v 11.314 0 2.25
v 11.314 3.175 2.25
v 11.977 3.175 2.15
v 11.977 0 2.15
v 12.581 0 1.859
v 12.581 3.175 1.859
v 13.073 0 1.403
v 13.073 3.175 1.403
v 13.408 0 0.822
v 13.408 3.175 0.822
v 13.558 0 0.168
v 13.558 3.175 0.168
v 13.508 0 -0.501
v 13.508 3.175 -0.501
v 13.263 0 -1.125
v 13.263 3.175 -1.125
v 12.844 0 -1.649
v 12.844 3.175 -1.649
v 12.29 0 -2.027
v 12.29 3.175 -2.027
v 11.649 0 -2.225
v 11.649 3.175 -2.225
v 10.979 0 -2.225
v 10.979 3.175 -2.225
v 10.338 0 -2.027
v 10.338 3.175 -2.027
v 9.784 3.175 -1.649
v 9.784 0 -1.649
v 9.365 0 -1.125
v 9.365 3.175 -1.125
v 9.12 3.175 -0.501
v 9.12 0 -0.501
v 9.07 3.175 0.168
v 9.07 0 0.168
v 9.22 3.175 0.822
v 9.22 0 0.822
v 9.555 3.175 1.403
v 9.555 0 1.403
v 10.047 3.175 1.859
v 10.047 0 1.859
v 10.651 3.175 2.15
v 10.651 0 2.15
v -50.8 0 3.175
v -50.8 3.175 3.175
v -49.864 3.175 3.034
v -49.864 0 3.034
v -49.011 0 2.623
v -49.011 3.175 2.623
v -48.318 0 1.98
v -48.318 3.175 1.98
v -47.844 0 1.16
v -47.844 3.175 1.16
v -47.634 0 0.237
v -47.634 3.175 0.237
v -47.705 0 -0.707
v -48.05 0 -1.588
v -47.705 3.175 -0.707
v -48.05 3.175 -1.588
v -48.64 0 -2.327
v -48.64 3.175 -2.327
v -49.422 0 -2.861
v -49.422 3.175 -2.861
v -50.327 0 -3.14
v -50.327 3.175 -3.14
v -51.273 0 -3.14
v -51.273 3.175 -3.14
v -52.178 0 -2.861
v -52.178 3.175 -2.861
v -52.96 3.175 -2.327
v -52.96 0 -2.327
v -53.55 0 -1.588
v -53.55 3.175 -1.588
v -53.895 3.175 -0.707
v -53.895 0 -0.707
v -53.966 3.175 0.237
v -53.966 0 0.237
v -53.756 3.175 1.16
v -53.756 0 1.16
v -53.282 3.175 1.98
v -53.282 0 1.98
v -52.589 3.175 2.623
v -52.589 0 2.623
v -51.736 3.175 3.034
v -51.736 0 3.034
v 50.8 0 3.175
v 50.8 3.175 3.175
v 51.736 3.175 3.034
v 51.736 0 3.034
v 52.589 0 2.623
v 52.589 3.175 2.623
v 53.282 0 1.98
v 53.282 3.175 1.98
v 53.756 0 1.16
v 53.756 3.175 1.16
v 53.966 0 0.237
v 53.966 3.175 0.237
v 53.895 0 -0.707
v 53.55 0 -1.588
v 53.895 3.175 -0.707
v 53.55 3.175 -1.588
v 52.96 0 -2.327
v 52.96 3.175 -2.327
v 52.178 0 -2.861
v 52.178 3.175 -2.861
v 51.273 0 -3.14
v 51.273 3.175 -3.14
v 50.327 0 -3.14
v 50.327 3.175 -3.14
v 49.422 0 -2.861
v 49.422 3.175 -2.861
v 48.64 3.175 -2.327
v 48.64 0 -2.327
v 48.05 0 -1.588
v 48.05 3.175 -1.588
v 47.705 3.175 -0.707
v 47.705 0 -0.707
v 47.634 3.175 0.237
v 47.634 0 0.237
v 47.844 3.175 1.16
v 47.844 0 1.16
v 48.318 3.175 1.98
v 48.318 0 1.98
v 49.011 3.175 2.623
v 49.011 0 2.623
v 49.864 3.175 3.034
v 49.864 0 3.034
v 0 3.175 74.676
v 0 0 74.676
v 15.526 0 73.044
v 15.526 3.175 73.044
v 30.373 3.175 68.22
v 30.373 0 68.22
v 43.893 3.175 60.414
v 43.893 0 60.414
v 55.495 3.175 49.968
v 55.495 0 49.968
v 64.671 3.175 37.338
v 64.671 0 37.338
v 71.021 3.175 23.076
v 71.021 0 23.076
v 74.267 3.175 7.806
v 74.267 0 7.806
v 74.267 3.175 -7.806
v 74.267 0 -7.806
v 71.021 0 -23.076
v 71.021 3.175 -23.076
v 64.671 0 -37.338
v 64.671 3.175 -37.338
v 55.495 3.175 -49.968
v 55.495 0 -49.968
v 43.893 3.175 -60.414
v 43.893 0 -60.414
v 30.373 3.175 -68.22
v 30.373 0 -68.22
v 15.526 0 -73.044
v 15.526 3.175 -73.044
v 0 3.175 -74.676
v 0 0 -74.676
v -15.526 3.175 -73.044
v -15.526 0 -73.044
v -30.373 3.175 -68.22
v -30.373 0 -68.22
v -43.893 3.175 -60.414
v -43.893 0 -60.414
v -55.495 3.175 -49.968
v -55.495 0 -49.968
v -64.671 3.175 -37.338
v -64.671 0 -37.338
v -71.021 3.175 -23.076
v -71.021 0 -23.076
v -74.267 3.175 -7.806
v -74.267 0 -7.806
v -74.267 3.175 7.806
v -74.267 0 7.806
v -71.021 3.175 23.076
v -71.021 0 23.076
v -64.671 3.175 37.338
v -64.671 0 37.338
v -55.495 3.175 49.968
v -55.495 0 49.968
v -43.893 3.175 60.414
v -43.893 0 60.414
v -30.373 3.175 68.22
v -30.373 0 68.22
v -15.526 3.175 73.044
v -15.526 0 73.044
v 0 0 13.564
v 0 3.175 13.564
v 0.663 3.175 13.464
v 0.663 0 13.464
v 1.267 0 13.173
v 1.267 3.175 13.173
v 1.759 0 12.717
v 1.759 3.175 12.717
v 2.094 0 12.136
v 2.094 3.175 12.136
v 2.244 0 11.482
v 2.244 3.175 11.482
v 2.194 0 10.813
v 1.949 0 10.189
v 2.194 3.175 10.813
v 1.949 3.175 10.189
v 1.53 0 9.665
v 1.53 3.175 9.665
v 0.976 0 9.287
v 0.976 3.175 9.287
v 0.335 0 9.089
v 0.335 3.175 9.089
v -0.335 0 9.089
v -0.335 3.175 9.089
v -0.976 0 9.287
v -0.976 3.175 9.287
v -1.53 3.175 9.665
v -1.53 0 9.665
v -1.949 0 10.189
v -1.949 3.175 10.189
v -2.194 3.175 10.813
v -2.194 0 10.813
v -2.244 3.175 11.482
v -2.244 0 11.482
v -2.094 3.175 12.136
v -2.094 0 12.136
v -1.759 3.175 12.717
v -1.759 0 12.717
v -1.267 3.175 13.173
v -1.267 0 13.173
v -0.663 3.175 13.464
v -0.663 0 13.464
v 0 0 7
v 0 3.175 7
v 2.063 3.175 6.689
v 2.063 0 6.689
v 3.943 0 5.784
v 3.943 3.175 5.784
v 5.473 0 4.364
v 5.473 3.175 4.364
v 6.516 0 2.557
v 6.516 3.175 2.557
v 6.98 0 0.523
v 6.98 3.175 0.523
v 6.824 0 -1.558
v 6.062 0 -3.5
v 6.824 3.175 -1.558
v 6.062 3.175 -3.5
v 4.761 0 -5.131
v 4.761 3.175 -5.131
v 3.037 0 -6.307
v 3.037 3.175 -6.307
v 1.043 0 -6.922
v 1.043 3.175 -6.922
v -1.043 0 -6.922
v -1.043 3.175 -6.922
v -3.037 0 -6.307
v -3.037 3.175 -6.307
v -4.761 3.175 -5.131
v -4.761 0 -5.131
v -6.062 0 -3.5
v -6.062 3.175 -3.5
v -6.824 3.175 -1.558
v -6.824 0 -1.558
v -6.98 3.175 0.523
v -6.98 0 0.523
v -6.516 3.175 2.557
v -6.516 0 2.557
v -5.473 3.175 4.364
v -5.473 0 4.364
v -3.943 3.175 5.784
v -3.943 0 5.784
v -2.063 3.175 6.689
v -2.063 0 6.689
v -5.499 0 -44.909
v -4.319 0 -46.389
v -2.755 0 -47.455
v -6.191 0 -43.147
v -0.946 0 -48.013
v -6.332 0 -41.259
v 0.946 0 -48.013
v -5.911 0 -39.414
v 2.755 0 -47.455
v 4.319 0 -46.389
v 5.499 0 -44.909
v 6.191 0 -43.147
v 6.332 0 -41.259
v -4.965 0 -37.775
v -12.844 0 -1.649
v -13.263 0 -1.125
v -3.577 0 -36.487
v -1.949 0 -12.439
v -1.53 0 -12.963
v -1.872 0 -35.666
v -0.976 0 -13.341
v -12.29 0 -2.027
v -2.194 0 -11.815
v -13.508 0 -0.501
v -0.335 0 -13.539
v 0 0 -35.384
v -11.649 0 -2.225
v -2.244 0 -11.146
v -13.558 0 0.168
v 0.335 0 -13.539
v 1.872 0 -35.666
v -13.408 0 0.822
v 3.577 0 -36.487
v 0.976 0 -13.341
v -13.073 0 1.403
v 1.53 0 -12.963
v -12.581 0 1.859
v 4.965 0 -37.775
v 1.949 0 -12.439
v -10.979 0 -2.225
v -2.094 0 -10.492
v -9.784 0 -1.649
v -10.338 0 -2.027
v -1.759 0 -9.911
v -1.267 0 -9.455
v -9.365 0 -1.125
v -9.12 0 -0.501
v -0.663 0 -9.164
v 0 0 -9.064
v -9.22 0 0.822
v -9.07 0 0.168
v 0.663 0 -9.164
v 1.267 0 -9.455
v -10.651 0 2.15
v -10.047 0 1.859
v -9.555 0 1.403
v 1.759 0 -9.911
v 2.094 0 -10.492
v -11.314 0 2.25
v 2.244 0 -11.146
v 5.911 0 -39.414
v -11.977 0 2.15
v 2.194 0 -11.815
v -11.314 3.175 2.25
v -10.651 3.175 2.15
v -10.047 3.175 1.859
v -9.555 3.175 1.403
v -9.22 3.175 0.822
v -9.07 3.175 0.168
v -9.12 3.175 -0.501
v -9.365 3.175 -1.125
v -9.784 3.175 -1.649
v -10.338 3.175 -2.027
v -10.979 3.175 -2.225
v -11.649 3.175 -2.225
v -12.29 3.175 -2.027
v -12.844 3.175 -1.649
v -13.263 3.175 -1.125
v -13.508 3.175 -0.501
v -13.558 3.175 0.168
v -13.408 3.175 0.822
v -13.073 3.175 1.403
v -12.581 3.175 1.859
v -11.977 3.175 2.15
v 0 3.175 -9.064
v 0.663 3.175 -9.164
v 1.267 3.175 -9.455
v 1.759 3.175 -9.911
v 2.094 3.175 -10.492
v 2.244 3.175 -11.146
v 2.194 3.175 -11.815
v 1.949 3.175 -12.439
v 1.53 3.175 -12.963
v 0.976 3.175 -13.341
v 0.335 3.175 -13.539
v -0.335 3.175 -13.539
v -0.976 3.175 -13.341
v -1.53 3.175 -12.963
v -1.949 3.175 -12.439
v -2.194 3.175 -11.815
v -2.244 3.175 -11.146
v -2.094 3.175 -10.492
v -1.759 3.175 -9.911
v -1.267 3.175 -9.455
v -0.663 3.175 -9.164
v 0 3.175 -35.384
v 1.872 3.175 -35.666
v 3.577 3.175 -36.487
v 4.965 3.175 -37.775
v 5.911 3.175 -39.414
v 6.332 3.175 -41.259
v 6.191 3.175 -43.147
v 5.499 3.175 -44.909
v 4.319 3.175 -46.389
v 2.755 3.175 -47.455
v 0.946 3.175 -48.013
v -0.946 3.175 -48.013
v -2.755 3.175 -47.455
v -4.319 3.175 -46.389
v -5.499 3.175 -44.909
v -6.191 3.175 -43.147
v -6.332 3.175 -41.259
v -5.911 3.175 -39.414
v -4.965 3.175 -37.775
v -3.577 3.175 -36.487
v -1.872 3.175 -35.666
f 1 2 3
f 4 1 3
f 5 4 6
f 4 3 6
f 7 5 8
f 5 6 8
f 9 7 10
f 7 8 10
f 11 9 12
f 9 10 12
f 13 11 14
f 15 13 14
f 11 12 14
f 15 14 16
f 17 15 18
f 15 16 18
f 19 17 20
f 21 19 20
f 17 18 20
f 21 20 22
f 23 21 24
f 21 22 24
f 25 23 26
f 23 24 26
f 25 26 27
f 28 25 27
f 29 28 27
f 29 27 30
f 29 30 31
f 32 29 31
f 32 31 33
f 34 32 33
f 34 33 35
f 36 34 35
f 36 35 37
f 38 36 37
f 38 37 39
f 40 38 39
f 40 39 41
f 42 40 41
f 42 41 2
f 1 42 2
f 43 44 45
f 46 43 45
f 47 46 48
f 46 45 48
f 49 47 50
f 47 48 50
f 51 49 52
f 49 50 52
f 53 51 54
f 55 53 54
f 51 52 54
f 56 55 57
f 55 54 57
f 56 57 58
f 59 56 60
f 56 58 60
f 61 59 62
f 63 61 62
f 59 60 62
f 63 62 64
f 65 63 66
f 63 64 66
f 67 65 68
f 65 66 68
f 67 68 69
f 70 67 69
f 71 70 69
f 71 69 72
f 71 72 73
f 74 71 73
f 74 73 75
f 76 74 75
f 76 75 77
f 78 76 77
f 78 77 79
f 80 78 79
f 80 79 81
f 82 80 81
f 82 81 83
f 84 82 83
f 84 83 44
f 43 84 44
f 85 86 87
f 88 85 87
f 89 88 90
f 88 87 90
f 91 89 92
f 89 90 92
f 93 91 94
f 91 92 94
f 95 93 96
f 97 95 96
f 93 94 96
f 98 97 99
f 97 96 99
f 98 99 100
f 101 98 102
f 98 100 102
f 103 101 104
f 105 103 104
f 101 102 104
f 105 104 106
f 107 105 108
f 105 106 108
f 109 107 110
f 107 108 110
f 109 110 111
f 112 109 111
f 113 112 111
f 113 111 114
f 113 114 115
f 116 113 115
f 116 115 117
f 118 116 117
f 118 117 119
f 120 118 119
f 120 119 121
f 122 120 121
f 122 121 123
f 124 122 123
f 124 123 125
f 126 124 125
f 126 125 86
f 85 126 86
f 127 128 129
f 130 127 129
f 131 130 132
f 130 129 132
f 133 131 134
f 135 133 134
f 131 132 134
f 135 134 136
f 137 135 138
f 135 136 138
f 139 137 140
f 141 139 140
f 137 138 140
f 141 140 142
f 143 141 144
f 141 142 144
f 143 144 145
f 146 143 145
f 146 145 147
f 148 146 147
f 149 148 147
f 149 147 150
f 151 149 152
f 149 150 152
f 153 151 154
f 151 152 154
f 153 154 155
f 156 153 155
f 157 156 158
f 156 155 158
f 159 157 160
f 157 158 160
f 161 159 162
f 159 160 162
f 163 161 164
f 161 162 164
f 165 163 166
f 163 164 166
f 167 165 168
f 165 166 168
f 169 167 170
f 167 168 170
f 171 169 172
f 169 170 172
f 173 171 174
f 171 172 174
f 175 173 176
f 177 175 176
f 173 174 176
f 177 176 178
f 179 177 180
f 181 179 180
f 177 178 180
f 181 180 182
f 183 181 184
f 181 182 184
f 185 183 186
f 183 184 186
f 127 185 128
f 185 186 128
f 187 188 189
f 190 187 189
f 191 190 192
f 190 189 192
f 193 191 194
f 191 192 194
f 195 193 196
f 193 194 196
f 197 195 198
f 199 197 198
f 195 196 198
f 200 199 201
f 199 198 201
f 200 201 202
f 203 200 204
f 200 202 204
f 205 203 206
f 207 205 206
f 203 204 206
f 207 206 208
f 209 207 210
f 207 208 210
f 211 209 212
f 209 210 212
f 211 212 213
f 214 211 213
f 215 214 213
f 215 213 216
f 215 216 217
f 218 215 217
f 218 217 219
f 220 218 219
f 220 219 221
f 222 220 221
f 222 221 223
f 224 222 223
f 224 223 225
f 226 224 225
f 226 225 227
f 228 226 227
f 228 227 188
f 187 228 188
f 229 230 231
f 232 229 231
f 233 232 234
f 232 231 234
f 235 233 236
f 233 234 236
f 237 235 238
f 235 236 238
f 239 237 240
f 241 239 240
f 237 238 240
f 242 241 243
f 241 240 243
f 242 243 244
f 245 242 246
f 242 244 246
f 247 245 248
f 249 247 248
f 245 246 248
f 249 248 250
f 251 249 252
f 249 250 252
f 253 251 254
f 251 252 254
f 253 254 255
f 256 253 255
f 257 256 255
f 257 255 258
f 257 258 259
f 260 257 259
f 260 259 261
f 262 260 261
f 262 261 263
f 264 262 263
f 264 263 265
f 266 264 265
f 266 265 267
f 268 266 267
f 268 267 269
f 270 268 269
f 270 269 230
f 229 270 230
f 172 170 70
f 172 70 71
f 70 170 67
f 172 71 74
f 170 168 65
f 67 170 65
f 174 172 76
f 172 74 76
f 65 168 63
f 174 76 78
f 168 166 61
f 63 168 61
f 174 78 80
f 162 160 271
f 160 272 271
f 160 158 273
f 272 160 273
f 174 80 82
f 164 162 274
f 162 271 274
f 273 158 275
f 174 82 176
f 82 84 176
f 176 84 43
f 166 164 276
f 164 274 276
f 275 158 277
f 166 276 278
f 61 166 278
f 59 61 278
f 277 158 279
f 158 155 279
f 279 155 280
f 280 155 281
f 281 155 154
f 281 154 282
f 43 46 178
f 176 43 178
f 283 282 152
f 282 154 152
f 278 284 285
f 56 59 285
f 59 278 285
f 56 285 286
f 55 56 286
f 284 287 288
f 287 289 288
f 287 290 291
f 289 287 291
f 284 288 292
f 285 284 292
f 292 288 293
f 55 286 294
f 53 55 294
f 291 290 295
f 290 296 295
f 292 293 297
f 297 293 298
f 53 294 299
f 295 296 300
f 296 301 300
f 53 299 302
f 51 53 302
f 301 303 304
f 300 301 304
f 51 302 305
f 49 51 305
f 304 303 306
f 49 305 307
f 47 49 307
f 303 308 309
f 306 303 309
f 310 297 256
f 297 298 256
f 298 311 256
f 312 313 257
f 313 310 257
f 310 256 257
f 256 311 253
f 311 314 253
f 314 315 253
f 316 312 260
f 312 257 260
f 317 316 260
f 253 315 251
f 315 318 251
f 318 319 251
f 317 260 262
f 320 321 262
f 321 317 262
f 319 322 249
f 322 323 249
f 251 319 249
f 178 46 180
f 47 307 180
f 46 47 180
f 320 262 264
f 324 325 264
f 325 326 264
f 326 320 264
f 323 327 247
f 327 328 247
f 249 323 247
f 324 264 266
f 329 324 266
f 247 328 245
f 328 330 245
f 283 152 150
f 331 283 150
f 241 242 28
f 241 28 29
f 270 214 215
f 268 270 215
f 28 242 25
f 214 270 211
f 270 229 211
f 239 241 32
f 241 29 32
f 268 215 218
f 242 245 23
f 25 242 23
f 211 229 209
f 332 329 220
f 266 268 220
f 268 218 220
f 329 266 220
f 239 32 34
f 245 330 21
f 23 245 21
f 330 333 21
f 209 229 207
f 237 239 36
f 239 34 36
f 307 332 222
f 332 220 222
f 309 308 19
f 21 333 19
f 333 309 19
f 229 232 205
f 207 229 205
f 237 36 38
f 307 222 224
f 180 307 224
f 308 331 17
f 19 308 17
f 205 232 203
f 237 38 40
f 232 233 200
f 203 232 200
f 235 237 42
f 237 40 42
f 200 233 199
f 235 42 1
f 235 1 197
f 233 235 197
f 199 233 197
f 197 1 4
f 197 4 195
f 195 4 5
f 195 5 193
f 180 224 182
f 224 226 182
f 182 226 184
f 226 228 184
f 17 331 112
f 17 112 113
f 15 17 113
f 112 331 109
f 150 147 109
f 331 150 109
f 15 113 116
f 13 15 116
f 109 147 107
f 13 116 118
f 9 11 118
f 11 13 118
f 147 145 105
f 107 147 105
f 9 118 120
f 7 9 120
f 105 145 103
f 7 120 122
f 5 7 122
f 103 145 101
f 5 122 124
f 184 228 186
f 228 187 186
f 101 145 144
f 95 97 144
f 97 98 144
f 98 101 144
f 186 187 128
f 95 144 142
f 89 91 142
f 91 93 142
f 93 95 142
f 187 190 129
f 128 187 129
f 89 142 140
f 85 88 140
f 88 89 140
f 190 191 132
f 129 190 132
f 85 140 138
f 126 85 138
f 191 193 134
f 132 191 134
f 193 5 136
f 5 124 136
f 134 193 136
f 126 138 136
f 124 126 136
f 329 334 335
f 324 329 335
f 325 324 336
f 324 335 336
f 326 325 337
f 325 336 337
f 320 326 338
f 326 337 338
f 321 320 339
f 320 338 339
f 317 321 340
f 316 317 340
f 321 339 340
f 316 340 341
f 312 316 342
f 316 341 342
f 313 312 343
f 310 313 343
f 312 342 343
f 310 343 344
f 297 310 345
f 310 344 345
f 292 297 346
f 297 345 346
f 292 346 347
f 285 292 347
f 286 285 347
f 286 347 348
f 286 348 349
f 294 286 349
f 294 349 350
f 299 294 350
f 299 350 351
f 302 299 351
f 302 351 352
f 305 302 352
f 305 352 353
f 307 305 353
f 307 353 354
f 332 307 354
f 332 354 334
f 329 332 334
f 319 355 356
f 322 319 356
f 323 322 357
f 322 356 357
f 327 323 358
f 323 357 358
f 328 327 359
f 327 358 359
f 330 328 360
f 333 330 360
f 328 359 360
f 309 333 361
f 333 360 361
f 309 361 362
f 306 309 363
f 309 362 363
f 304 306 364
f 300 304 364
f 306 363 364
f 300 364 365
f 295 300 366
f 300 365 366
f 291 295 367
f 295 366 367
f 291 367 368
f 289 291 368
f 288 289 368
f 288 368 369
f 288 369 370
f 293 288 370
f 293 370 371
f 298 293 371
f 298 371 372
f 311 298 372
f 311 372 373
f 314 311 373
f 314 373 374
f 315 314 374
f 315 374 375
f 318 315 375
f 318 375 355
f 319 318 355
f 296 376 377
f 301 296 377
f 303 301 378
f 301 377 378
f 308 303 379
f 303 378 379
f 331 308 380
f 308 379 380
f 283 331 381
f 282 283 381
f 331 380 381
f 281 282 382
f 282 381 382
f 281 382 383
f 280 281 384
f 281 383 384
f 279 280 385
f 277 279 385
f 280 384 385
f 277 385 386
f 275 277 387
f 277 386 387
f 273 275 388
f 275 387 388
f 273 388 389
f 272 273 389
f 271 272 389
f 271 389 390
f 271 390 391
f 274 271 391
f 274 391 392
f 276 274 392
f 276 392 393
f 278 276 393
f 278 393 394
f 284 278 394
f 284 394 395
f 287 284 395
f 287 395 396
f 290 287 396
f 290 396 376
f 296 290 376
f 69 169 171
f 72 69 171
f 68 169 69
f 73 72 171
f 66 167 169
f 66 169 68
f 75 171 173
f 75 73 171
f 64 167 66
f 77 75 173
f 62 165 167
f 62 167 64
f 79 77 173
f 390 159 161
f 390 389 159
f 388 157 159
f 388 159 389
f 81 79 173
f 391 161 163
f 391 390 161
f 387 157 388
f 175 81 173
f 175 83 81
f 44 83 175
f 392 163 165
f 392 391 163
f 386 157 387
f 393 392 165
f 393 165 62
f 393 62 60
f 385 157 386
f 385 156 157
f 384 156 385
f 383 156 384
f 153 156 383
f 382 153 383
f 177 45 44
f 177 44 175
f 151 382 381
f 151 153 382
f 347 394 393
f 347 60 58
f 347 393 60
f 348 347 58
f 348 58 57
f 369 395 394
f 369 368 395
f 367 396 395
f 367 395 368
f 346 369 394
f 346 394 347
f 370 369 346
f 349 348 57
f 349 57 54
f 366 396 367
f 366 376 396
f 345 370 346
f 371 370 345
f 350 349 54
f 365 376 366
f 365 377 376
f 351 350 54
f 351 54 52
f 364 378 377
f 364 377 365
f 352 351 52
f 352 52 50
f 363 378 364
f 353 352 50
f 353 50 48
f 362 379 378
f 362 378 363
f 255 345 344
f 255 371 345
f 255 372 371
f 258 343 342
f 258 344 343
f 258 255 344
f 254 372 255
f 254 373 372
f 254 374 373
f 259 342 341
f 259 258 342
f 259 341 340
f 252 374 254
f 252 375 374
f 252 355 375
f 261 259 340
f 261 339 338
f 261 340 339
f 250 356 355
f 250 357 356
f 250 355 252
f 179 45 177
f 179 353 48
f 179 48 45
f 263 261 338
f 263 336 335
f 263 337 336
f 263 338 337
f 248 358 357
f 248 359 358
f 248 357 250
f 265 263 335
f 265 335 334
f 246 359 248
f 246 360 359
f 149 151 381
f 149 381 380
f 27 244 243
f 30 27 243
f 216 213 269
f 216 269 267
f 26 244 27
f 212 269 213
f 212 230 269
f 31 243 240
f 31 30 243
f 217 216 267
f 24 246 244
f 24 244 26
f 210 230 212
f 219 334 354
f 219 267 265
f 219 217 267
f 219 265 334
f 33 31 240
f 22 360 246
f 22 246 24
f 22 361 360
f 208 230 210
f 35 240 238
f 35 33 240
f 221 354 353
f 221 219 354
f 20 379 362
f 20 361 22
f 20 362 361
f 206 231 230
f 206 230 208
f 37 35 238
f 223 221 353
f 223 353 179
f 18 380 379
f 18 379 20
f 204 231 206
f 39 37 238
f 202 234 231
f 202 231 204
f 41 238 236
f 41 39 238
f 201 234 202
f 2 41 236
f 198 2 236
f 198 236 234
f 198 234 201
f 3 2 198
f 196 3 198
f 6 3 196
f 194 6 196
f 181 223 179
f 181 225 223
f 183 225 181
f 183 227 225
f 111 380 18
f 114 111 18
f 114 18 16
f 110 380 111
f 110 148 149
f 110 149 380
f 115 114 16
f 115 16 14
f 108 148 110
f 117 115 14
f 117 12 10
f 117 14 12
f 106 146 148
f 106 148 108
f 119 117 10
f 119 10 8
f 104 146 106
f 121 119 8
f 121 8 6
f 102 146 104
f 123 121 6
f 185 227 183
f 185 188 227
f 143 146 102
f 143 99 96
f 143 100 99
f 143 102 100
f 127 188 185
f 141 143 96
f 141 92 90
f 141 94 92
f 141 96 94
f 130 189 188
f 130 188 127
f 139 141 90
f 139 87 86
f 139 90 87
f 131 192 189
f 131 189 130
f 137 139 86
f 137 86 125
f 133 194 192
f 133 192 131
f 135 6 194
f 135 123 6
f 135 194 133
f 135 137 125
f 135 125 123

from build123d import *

# Parameters (mm, degrees)
SKETCH1_R           = 74.676
BOSS_EXTRUDE1_DEPTH = 3.175
SKETCH2_R           = 7
CUT_EXTRUDE1_DEPTH  = 106.655527906
SKETCH3_R           = 2.25
CUT_EXTRUDE2_DEPTH  = 106.655527906
SKETCH4_R           = 3.175
CUT_EXTRUDE3_DEPTH  = 106.655527906
CUT_EXTRUDE5_REACH  = 107.656
SKETCH6_R           = 6.35


with BuildPart() as part:
    # Sketch1 → Boss-Extrude1 (new body)
    with BuildSketch(Plane(origin=(0, 0, 0), x_dir=(1, 0, 0), z_dir=(0, 1, 0))):
        with Locations(Location((0, 0, 0), (0, 0, 270))):
            Circle(SKETCH1_R)
    extrude(amount=BOSS_EXTRUDE1_DEPTH)

    # Sketch2 → Cut-Extrude1 (cut, through all)
    with BuildSketch(Plane(origin=(0, 3.175, 0), x_dir=(1, 0, 0), z_dir=(0, 1, 0))):
        with Locations(Location((0, 0, 0), (0, 0, 270))):
            Circle(SKETCH2_R)
    extrude(amount=-CUT_EXTRUDE1_DEPTH, mode=Mode.SUBTRACT)

    # Sketch3 → Cut-Extrude2 (cut, through all)
    with BuildSketch(Plane(origin=(0, 3.175, 0), x_dir=(1, 0, 0), z_dir=(0, 1, 0))):
        with Locations(Location((11.314, 0, 0), (0, 0, 270))):
            Circle(SKETCH3_R)
        with Locations(Location((0, -11.314, 0), (0, 0, 270))):
            Circle(SKETCH3_R)
        with Locations(Location((-11.314, 0, 0), (0, 0, 270))):
            Circle(SKETCH3_R)
        with Locations(Location((0, 11.314, 0), (0, 0, 270))):
            Circle(SKETCH3_R)
    extrude(amount=-CUT_EXTRUDE2_DEPTH, mode=Mode.SUBTRACT)

    # Sketch4 → Cut-Extrude3 (cut, through all)
    with BuildSketch(Plane(origin=(0, 3.175, 0), x_dir=(1, 0, 0), z_dir=(0, 1, 0))):
        with Locations(Location((50.8, 0, 0), (0, 0, 270))):
            Circle(SKETCH4_R)
        with Locations(Location((-50.8, 0, 0), (0, 0, 270))):
            Circle(SKETCH4_R)
    extrude(amount=-CUT_EXTRUDE3_DEPTH, mode=Mode.SUBTRACT)

    # Sketch6 → Cut-Extrude5 (cut, up to next)
    with BuildSketch(Plane(origin=(0, 3.175, 0), x_dir=(1, 0, 0), z_dir=(0, 1, 0)), mode=Mode.PRIVATE) as cut_extrude5_sk1:
        with Locations(Location((0, 41.73382544, 0), (0, 0, 270))):
            Circle(SKETCH6_R)
    cut_extrude5_tool1 = extrude(cut_extrude5_sk1.sketch, amount=-CUT_EXTRUDE5_REACH, mode=Mode.PRIVATE) & part.part
    add(cut_extrude5_tool1.solids().sort_by_distance((0, 3.175, -41.733825))[0], mode=Mode.SUBTRACT)


solid = part.part
